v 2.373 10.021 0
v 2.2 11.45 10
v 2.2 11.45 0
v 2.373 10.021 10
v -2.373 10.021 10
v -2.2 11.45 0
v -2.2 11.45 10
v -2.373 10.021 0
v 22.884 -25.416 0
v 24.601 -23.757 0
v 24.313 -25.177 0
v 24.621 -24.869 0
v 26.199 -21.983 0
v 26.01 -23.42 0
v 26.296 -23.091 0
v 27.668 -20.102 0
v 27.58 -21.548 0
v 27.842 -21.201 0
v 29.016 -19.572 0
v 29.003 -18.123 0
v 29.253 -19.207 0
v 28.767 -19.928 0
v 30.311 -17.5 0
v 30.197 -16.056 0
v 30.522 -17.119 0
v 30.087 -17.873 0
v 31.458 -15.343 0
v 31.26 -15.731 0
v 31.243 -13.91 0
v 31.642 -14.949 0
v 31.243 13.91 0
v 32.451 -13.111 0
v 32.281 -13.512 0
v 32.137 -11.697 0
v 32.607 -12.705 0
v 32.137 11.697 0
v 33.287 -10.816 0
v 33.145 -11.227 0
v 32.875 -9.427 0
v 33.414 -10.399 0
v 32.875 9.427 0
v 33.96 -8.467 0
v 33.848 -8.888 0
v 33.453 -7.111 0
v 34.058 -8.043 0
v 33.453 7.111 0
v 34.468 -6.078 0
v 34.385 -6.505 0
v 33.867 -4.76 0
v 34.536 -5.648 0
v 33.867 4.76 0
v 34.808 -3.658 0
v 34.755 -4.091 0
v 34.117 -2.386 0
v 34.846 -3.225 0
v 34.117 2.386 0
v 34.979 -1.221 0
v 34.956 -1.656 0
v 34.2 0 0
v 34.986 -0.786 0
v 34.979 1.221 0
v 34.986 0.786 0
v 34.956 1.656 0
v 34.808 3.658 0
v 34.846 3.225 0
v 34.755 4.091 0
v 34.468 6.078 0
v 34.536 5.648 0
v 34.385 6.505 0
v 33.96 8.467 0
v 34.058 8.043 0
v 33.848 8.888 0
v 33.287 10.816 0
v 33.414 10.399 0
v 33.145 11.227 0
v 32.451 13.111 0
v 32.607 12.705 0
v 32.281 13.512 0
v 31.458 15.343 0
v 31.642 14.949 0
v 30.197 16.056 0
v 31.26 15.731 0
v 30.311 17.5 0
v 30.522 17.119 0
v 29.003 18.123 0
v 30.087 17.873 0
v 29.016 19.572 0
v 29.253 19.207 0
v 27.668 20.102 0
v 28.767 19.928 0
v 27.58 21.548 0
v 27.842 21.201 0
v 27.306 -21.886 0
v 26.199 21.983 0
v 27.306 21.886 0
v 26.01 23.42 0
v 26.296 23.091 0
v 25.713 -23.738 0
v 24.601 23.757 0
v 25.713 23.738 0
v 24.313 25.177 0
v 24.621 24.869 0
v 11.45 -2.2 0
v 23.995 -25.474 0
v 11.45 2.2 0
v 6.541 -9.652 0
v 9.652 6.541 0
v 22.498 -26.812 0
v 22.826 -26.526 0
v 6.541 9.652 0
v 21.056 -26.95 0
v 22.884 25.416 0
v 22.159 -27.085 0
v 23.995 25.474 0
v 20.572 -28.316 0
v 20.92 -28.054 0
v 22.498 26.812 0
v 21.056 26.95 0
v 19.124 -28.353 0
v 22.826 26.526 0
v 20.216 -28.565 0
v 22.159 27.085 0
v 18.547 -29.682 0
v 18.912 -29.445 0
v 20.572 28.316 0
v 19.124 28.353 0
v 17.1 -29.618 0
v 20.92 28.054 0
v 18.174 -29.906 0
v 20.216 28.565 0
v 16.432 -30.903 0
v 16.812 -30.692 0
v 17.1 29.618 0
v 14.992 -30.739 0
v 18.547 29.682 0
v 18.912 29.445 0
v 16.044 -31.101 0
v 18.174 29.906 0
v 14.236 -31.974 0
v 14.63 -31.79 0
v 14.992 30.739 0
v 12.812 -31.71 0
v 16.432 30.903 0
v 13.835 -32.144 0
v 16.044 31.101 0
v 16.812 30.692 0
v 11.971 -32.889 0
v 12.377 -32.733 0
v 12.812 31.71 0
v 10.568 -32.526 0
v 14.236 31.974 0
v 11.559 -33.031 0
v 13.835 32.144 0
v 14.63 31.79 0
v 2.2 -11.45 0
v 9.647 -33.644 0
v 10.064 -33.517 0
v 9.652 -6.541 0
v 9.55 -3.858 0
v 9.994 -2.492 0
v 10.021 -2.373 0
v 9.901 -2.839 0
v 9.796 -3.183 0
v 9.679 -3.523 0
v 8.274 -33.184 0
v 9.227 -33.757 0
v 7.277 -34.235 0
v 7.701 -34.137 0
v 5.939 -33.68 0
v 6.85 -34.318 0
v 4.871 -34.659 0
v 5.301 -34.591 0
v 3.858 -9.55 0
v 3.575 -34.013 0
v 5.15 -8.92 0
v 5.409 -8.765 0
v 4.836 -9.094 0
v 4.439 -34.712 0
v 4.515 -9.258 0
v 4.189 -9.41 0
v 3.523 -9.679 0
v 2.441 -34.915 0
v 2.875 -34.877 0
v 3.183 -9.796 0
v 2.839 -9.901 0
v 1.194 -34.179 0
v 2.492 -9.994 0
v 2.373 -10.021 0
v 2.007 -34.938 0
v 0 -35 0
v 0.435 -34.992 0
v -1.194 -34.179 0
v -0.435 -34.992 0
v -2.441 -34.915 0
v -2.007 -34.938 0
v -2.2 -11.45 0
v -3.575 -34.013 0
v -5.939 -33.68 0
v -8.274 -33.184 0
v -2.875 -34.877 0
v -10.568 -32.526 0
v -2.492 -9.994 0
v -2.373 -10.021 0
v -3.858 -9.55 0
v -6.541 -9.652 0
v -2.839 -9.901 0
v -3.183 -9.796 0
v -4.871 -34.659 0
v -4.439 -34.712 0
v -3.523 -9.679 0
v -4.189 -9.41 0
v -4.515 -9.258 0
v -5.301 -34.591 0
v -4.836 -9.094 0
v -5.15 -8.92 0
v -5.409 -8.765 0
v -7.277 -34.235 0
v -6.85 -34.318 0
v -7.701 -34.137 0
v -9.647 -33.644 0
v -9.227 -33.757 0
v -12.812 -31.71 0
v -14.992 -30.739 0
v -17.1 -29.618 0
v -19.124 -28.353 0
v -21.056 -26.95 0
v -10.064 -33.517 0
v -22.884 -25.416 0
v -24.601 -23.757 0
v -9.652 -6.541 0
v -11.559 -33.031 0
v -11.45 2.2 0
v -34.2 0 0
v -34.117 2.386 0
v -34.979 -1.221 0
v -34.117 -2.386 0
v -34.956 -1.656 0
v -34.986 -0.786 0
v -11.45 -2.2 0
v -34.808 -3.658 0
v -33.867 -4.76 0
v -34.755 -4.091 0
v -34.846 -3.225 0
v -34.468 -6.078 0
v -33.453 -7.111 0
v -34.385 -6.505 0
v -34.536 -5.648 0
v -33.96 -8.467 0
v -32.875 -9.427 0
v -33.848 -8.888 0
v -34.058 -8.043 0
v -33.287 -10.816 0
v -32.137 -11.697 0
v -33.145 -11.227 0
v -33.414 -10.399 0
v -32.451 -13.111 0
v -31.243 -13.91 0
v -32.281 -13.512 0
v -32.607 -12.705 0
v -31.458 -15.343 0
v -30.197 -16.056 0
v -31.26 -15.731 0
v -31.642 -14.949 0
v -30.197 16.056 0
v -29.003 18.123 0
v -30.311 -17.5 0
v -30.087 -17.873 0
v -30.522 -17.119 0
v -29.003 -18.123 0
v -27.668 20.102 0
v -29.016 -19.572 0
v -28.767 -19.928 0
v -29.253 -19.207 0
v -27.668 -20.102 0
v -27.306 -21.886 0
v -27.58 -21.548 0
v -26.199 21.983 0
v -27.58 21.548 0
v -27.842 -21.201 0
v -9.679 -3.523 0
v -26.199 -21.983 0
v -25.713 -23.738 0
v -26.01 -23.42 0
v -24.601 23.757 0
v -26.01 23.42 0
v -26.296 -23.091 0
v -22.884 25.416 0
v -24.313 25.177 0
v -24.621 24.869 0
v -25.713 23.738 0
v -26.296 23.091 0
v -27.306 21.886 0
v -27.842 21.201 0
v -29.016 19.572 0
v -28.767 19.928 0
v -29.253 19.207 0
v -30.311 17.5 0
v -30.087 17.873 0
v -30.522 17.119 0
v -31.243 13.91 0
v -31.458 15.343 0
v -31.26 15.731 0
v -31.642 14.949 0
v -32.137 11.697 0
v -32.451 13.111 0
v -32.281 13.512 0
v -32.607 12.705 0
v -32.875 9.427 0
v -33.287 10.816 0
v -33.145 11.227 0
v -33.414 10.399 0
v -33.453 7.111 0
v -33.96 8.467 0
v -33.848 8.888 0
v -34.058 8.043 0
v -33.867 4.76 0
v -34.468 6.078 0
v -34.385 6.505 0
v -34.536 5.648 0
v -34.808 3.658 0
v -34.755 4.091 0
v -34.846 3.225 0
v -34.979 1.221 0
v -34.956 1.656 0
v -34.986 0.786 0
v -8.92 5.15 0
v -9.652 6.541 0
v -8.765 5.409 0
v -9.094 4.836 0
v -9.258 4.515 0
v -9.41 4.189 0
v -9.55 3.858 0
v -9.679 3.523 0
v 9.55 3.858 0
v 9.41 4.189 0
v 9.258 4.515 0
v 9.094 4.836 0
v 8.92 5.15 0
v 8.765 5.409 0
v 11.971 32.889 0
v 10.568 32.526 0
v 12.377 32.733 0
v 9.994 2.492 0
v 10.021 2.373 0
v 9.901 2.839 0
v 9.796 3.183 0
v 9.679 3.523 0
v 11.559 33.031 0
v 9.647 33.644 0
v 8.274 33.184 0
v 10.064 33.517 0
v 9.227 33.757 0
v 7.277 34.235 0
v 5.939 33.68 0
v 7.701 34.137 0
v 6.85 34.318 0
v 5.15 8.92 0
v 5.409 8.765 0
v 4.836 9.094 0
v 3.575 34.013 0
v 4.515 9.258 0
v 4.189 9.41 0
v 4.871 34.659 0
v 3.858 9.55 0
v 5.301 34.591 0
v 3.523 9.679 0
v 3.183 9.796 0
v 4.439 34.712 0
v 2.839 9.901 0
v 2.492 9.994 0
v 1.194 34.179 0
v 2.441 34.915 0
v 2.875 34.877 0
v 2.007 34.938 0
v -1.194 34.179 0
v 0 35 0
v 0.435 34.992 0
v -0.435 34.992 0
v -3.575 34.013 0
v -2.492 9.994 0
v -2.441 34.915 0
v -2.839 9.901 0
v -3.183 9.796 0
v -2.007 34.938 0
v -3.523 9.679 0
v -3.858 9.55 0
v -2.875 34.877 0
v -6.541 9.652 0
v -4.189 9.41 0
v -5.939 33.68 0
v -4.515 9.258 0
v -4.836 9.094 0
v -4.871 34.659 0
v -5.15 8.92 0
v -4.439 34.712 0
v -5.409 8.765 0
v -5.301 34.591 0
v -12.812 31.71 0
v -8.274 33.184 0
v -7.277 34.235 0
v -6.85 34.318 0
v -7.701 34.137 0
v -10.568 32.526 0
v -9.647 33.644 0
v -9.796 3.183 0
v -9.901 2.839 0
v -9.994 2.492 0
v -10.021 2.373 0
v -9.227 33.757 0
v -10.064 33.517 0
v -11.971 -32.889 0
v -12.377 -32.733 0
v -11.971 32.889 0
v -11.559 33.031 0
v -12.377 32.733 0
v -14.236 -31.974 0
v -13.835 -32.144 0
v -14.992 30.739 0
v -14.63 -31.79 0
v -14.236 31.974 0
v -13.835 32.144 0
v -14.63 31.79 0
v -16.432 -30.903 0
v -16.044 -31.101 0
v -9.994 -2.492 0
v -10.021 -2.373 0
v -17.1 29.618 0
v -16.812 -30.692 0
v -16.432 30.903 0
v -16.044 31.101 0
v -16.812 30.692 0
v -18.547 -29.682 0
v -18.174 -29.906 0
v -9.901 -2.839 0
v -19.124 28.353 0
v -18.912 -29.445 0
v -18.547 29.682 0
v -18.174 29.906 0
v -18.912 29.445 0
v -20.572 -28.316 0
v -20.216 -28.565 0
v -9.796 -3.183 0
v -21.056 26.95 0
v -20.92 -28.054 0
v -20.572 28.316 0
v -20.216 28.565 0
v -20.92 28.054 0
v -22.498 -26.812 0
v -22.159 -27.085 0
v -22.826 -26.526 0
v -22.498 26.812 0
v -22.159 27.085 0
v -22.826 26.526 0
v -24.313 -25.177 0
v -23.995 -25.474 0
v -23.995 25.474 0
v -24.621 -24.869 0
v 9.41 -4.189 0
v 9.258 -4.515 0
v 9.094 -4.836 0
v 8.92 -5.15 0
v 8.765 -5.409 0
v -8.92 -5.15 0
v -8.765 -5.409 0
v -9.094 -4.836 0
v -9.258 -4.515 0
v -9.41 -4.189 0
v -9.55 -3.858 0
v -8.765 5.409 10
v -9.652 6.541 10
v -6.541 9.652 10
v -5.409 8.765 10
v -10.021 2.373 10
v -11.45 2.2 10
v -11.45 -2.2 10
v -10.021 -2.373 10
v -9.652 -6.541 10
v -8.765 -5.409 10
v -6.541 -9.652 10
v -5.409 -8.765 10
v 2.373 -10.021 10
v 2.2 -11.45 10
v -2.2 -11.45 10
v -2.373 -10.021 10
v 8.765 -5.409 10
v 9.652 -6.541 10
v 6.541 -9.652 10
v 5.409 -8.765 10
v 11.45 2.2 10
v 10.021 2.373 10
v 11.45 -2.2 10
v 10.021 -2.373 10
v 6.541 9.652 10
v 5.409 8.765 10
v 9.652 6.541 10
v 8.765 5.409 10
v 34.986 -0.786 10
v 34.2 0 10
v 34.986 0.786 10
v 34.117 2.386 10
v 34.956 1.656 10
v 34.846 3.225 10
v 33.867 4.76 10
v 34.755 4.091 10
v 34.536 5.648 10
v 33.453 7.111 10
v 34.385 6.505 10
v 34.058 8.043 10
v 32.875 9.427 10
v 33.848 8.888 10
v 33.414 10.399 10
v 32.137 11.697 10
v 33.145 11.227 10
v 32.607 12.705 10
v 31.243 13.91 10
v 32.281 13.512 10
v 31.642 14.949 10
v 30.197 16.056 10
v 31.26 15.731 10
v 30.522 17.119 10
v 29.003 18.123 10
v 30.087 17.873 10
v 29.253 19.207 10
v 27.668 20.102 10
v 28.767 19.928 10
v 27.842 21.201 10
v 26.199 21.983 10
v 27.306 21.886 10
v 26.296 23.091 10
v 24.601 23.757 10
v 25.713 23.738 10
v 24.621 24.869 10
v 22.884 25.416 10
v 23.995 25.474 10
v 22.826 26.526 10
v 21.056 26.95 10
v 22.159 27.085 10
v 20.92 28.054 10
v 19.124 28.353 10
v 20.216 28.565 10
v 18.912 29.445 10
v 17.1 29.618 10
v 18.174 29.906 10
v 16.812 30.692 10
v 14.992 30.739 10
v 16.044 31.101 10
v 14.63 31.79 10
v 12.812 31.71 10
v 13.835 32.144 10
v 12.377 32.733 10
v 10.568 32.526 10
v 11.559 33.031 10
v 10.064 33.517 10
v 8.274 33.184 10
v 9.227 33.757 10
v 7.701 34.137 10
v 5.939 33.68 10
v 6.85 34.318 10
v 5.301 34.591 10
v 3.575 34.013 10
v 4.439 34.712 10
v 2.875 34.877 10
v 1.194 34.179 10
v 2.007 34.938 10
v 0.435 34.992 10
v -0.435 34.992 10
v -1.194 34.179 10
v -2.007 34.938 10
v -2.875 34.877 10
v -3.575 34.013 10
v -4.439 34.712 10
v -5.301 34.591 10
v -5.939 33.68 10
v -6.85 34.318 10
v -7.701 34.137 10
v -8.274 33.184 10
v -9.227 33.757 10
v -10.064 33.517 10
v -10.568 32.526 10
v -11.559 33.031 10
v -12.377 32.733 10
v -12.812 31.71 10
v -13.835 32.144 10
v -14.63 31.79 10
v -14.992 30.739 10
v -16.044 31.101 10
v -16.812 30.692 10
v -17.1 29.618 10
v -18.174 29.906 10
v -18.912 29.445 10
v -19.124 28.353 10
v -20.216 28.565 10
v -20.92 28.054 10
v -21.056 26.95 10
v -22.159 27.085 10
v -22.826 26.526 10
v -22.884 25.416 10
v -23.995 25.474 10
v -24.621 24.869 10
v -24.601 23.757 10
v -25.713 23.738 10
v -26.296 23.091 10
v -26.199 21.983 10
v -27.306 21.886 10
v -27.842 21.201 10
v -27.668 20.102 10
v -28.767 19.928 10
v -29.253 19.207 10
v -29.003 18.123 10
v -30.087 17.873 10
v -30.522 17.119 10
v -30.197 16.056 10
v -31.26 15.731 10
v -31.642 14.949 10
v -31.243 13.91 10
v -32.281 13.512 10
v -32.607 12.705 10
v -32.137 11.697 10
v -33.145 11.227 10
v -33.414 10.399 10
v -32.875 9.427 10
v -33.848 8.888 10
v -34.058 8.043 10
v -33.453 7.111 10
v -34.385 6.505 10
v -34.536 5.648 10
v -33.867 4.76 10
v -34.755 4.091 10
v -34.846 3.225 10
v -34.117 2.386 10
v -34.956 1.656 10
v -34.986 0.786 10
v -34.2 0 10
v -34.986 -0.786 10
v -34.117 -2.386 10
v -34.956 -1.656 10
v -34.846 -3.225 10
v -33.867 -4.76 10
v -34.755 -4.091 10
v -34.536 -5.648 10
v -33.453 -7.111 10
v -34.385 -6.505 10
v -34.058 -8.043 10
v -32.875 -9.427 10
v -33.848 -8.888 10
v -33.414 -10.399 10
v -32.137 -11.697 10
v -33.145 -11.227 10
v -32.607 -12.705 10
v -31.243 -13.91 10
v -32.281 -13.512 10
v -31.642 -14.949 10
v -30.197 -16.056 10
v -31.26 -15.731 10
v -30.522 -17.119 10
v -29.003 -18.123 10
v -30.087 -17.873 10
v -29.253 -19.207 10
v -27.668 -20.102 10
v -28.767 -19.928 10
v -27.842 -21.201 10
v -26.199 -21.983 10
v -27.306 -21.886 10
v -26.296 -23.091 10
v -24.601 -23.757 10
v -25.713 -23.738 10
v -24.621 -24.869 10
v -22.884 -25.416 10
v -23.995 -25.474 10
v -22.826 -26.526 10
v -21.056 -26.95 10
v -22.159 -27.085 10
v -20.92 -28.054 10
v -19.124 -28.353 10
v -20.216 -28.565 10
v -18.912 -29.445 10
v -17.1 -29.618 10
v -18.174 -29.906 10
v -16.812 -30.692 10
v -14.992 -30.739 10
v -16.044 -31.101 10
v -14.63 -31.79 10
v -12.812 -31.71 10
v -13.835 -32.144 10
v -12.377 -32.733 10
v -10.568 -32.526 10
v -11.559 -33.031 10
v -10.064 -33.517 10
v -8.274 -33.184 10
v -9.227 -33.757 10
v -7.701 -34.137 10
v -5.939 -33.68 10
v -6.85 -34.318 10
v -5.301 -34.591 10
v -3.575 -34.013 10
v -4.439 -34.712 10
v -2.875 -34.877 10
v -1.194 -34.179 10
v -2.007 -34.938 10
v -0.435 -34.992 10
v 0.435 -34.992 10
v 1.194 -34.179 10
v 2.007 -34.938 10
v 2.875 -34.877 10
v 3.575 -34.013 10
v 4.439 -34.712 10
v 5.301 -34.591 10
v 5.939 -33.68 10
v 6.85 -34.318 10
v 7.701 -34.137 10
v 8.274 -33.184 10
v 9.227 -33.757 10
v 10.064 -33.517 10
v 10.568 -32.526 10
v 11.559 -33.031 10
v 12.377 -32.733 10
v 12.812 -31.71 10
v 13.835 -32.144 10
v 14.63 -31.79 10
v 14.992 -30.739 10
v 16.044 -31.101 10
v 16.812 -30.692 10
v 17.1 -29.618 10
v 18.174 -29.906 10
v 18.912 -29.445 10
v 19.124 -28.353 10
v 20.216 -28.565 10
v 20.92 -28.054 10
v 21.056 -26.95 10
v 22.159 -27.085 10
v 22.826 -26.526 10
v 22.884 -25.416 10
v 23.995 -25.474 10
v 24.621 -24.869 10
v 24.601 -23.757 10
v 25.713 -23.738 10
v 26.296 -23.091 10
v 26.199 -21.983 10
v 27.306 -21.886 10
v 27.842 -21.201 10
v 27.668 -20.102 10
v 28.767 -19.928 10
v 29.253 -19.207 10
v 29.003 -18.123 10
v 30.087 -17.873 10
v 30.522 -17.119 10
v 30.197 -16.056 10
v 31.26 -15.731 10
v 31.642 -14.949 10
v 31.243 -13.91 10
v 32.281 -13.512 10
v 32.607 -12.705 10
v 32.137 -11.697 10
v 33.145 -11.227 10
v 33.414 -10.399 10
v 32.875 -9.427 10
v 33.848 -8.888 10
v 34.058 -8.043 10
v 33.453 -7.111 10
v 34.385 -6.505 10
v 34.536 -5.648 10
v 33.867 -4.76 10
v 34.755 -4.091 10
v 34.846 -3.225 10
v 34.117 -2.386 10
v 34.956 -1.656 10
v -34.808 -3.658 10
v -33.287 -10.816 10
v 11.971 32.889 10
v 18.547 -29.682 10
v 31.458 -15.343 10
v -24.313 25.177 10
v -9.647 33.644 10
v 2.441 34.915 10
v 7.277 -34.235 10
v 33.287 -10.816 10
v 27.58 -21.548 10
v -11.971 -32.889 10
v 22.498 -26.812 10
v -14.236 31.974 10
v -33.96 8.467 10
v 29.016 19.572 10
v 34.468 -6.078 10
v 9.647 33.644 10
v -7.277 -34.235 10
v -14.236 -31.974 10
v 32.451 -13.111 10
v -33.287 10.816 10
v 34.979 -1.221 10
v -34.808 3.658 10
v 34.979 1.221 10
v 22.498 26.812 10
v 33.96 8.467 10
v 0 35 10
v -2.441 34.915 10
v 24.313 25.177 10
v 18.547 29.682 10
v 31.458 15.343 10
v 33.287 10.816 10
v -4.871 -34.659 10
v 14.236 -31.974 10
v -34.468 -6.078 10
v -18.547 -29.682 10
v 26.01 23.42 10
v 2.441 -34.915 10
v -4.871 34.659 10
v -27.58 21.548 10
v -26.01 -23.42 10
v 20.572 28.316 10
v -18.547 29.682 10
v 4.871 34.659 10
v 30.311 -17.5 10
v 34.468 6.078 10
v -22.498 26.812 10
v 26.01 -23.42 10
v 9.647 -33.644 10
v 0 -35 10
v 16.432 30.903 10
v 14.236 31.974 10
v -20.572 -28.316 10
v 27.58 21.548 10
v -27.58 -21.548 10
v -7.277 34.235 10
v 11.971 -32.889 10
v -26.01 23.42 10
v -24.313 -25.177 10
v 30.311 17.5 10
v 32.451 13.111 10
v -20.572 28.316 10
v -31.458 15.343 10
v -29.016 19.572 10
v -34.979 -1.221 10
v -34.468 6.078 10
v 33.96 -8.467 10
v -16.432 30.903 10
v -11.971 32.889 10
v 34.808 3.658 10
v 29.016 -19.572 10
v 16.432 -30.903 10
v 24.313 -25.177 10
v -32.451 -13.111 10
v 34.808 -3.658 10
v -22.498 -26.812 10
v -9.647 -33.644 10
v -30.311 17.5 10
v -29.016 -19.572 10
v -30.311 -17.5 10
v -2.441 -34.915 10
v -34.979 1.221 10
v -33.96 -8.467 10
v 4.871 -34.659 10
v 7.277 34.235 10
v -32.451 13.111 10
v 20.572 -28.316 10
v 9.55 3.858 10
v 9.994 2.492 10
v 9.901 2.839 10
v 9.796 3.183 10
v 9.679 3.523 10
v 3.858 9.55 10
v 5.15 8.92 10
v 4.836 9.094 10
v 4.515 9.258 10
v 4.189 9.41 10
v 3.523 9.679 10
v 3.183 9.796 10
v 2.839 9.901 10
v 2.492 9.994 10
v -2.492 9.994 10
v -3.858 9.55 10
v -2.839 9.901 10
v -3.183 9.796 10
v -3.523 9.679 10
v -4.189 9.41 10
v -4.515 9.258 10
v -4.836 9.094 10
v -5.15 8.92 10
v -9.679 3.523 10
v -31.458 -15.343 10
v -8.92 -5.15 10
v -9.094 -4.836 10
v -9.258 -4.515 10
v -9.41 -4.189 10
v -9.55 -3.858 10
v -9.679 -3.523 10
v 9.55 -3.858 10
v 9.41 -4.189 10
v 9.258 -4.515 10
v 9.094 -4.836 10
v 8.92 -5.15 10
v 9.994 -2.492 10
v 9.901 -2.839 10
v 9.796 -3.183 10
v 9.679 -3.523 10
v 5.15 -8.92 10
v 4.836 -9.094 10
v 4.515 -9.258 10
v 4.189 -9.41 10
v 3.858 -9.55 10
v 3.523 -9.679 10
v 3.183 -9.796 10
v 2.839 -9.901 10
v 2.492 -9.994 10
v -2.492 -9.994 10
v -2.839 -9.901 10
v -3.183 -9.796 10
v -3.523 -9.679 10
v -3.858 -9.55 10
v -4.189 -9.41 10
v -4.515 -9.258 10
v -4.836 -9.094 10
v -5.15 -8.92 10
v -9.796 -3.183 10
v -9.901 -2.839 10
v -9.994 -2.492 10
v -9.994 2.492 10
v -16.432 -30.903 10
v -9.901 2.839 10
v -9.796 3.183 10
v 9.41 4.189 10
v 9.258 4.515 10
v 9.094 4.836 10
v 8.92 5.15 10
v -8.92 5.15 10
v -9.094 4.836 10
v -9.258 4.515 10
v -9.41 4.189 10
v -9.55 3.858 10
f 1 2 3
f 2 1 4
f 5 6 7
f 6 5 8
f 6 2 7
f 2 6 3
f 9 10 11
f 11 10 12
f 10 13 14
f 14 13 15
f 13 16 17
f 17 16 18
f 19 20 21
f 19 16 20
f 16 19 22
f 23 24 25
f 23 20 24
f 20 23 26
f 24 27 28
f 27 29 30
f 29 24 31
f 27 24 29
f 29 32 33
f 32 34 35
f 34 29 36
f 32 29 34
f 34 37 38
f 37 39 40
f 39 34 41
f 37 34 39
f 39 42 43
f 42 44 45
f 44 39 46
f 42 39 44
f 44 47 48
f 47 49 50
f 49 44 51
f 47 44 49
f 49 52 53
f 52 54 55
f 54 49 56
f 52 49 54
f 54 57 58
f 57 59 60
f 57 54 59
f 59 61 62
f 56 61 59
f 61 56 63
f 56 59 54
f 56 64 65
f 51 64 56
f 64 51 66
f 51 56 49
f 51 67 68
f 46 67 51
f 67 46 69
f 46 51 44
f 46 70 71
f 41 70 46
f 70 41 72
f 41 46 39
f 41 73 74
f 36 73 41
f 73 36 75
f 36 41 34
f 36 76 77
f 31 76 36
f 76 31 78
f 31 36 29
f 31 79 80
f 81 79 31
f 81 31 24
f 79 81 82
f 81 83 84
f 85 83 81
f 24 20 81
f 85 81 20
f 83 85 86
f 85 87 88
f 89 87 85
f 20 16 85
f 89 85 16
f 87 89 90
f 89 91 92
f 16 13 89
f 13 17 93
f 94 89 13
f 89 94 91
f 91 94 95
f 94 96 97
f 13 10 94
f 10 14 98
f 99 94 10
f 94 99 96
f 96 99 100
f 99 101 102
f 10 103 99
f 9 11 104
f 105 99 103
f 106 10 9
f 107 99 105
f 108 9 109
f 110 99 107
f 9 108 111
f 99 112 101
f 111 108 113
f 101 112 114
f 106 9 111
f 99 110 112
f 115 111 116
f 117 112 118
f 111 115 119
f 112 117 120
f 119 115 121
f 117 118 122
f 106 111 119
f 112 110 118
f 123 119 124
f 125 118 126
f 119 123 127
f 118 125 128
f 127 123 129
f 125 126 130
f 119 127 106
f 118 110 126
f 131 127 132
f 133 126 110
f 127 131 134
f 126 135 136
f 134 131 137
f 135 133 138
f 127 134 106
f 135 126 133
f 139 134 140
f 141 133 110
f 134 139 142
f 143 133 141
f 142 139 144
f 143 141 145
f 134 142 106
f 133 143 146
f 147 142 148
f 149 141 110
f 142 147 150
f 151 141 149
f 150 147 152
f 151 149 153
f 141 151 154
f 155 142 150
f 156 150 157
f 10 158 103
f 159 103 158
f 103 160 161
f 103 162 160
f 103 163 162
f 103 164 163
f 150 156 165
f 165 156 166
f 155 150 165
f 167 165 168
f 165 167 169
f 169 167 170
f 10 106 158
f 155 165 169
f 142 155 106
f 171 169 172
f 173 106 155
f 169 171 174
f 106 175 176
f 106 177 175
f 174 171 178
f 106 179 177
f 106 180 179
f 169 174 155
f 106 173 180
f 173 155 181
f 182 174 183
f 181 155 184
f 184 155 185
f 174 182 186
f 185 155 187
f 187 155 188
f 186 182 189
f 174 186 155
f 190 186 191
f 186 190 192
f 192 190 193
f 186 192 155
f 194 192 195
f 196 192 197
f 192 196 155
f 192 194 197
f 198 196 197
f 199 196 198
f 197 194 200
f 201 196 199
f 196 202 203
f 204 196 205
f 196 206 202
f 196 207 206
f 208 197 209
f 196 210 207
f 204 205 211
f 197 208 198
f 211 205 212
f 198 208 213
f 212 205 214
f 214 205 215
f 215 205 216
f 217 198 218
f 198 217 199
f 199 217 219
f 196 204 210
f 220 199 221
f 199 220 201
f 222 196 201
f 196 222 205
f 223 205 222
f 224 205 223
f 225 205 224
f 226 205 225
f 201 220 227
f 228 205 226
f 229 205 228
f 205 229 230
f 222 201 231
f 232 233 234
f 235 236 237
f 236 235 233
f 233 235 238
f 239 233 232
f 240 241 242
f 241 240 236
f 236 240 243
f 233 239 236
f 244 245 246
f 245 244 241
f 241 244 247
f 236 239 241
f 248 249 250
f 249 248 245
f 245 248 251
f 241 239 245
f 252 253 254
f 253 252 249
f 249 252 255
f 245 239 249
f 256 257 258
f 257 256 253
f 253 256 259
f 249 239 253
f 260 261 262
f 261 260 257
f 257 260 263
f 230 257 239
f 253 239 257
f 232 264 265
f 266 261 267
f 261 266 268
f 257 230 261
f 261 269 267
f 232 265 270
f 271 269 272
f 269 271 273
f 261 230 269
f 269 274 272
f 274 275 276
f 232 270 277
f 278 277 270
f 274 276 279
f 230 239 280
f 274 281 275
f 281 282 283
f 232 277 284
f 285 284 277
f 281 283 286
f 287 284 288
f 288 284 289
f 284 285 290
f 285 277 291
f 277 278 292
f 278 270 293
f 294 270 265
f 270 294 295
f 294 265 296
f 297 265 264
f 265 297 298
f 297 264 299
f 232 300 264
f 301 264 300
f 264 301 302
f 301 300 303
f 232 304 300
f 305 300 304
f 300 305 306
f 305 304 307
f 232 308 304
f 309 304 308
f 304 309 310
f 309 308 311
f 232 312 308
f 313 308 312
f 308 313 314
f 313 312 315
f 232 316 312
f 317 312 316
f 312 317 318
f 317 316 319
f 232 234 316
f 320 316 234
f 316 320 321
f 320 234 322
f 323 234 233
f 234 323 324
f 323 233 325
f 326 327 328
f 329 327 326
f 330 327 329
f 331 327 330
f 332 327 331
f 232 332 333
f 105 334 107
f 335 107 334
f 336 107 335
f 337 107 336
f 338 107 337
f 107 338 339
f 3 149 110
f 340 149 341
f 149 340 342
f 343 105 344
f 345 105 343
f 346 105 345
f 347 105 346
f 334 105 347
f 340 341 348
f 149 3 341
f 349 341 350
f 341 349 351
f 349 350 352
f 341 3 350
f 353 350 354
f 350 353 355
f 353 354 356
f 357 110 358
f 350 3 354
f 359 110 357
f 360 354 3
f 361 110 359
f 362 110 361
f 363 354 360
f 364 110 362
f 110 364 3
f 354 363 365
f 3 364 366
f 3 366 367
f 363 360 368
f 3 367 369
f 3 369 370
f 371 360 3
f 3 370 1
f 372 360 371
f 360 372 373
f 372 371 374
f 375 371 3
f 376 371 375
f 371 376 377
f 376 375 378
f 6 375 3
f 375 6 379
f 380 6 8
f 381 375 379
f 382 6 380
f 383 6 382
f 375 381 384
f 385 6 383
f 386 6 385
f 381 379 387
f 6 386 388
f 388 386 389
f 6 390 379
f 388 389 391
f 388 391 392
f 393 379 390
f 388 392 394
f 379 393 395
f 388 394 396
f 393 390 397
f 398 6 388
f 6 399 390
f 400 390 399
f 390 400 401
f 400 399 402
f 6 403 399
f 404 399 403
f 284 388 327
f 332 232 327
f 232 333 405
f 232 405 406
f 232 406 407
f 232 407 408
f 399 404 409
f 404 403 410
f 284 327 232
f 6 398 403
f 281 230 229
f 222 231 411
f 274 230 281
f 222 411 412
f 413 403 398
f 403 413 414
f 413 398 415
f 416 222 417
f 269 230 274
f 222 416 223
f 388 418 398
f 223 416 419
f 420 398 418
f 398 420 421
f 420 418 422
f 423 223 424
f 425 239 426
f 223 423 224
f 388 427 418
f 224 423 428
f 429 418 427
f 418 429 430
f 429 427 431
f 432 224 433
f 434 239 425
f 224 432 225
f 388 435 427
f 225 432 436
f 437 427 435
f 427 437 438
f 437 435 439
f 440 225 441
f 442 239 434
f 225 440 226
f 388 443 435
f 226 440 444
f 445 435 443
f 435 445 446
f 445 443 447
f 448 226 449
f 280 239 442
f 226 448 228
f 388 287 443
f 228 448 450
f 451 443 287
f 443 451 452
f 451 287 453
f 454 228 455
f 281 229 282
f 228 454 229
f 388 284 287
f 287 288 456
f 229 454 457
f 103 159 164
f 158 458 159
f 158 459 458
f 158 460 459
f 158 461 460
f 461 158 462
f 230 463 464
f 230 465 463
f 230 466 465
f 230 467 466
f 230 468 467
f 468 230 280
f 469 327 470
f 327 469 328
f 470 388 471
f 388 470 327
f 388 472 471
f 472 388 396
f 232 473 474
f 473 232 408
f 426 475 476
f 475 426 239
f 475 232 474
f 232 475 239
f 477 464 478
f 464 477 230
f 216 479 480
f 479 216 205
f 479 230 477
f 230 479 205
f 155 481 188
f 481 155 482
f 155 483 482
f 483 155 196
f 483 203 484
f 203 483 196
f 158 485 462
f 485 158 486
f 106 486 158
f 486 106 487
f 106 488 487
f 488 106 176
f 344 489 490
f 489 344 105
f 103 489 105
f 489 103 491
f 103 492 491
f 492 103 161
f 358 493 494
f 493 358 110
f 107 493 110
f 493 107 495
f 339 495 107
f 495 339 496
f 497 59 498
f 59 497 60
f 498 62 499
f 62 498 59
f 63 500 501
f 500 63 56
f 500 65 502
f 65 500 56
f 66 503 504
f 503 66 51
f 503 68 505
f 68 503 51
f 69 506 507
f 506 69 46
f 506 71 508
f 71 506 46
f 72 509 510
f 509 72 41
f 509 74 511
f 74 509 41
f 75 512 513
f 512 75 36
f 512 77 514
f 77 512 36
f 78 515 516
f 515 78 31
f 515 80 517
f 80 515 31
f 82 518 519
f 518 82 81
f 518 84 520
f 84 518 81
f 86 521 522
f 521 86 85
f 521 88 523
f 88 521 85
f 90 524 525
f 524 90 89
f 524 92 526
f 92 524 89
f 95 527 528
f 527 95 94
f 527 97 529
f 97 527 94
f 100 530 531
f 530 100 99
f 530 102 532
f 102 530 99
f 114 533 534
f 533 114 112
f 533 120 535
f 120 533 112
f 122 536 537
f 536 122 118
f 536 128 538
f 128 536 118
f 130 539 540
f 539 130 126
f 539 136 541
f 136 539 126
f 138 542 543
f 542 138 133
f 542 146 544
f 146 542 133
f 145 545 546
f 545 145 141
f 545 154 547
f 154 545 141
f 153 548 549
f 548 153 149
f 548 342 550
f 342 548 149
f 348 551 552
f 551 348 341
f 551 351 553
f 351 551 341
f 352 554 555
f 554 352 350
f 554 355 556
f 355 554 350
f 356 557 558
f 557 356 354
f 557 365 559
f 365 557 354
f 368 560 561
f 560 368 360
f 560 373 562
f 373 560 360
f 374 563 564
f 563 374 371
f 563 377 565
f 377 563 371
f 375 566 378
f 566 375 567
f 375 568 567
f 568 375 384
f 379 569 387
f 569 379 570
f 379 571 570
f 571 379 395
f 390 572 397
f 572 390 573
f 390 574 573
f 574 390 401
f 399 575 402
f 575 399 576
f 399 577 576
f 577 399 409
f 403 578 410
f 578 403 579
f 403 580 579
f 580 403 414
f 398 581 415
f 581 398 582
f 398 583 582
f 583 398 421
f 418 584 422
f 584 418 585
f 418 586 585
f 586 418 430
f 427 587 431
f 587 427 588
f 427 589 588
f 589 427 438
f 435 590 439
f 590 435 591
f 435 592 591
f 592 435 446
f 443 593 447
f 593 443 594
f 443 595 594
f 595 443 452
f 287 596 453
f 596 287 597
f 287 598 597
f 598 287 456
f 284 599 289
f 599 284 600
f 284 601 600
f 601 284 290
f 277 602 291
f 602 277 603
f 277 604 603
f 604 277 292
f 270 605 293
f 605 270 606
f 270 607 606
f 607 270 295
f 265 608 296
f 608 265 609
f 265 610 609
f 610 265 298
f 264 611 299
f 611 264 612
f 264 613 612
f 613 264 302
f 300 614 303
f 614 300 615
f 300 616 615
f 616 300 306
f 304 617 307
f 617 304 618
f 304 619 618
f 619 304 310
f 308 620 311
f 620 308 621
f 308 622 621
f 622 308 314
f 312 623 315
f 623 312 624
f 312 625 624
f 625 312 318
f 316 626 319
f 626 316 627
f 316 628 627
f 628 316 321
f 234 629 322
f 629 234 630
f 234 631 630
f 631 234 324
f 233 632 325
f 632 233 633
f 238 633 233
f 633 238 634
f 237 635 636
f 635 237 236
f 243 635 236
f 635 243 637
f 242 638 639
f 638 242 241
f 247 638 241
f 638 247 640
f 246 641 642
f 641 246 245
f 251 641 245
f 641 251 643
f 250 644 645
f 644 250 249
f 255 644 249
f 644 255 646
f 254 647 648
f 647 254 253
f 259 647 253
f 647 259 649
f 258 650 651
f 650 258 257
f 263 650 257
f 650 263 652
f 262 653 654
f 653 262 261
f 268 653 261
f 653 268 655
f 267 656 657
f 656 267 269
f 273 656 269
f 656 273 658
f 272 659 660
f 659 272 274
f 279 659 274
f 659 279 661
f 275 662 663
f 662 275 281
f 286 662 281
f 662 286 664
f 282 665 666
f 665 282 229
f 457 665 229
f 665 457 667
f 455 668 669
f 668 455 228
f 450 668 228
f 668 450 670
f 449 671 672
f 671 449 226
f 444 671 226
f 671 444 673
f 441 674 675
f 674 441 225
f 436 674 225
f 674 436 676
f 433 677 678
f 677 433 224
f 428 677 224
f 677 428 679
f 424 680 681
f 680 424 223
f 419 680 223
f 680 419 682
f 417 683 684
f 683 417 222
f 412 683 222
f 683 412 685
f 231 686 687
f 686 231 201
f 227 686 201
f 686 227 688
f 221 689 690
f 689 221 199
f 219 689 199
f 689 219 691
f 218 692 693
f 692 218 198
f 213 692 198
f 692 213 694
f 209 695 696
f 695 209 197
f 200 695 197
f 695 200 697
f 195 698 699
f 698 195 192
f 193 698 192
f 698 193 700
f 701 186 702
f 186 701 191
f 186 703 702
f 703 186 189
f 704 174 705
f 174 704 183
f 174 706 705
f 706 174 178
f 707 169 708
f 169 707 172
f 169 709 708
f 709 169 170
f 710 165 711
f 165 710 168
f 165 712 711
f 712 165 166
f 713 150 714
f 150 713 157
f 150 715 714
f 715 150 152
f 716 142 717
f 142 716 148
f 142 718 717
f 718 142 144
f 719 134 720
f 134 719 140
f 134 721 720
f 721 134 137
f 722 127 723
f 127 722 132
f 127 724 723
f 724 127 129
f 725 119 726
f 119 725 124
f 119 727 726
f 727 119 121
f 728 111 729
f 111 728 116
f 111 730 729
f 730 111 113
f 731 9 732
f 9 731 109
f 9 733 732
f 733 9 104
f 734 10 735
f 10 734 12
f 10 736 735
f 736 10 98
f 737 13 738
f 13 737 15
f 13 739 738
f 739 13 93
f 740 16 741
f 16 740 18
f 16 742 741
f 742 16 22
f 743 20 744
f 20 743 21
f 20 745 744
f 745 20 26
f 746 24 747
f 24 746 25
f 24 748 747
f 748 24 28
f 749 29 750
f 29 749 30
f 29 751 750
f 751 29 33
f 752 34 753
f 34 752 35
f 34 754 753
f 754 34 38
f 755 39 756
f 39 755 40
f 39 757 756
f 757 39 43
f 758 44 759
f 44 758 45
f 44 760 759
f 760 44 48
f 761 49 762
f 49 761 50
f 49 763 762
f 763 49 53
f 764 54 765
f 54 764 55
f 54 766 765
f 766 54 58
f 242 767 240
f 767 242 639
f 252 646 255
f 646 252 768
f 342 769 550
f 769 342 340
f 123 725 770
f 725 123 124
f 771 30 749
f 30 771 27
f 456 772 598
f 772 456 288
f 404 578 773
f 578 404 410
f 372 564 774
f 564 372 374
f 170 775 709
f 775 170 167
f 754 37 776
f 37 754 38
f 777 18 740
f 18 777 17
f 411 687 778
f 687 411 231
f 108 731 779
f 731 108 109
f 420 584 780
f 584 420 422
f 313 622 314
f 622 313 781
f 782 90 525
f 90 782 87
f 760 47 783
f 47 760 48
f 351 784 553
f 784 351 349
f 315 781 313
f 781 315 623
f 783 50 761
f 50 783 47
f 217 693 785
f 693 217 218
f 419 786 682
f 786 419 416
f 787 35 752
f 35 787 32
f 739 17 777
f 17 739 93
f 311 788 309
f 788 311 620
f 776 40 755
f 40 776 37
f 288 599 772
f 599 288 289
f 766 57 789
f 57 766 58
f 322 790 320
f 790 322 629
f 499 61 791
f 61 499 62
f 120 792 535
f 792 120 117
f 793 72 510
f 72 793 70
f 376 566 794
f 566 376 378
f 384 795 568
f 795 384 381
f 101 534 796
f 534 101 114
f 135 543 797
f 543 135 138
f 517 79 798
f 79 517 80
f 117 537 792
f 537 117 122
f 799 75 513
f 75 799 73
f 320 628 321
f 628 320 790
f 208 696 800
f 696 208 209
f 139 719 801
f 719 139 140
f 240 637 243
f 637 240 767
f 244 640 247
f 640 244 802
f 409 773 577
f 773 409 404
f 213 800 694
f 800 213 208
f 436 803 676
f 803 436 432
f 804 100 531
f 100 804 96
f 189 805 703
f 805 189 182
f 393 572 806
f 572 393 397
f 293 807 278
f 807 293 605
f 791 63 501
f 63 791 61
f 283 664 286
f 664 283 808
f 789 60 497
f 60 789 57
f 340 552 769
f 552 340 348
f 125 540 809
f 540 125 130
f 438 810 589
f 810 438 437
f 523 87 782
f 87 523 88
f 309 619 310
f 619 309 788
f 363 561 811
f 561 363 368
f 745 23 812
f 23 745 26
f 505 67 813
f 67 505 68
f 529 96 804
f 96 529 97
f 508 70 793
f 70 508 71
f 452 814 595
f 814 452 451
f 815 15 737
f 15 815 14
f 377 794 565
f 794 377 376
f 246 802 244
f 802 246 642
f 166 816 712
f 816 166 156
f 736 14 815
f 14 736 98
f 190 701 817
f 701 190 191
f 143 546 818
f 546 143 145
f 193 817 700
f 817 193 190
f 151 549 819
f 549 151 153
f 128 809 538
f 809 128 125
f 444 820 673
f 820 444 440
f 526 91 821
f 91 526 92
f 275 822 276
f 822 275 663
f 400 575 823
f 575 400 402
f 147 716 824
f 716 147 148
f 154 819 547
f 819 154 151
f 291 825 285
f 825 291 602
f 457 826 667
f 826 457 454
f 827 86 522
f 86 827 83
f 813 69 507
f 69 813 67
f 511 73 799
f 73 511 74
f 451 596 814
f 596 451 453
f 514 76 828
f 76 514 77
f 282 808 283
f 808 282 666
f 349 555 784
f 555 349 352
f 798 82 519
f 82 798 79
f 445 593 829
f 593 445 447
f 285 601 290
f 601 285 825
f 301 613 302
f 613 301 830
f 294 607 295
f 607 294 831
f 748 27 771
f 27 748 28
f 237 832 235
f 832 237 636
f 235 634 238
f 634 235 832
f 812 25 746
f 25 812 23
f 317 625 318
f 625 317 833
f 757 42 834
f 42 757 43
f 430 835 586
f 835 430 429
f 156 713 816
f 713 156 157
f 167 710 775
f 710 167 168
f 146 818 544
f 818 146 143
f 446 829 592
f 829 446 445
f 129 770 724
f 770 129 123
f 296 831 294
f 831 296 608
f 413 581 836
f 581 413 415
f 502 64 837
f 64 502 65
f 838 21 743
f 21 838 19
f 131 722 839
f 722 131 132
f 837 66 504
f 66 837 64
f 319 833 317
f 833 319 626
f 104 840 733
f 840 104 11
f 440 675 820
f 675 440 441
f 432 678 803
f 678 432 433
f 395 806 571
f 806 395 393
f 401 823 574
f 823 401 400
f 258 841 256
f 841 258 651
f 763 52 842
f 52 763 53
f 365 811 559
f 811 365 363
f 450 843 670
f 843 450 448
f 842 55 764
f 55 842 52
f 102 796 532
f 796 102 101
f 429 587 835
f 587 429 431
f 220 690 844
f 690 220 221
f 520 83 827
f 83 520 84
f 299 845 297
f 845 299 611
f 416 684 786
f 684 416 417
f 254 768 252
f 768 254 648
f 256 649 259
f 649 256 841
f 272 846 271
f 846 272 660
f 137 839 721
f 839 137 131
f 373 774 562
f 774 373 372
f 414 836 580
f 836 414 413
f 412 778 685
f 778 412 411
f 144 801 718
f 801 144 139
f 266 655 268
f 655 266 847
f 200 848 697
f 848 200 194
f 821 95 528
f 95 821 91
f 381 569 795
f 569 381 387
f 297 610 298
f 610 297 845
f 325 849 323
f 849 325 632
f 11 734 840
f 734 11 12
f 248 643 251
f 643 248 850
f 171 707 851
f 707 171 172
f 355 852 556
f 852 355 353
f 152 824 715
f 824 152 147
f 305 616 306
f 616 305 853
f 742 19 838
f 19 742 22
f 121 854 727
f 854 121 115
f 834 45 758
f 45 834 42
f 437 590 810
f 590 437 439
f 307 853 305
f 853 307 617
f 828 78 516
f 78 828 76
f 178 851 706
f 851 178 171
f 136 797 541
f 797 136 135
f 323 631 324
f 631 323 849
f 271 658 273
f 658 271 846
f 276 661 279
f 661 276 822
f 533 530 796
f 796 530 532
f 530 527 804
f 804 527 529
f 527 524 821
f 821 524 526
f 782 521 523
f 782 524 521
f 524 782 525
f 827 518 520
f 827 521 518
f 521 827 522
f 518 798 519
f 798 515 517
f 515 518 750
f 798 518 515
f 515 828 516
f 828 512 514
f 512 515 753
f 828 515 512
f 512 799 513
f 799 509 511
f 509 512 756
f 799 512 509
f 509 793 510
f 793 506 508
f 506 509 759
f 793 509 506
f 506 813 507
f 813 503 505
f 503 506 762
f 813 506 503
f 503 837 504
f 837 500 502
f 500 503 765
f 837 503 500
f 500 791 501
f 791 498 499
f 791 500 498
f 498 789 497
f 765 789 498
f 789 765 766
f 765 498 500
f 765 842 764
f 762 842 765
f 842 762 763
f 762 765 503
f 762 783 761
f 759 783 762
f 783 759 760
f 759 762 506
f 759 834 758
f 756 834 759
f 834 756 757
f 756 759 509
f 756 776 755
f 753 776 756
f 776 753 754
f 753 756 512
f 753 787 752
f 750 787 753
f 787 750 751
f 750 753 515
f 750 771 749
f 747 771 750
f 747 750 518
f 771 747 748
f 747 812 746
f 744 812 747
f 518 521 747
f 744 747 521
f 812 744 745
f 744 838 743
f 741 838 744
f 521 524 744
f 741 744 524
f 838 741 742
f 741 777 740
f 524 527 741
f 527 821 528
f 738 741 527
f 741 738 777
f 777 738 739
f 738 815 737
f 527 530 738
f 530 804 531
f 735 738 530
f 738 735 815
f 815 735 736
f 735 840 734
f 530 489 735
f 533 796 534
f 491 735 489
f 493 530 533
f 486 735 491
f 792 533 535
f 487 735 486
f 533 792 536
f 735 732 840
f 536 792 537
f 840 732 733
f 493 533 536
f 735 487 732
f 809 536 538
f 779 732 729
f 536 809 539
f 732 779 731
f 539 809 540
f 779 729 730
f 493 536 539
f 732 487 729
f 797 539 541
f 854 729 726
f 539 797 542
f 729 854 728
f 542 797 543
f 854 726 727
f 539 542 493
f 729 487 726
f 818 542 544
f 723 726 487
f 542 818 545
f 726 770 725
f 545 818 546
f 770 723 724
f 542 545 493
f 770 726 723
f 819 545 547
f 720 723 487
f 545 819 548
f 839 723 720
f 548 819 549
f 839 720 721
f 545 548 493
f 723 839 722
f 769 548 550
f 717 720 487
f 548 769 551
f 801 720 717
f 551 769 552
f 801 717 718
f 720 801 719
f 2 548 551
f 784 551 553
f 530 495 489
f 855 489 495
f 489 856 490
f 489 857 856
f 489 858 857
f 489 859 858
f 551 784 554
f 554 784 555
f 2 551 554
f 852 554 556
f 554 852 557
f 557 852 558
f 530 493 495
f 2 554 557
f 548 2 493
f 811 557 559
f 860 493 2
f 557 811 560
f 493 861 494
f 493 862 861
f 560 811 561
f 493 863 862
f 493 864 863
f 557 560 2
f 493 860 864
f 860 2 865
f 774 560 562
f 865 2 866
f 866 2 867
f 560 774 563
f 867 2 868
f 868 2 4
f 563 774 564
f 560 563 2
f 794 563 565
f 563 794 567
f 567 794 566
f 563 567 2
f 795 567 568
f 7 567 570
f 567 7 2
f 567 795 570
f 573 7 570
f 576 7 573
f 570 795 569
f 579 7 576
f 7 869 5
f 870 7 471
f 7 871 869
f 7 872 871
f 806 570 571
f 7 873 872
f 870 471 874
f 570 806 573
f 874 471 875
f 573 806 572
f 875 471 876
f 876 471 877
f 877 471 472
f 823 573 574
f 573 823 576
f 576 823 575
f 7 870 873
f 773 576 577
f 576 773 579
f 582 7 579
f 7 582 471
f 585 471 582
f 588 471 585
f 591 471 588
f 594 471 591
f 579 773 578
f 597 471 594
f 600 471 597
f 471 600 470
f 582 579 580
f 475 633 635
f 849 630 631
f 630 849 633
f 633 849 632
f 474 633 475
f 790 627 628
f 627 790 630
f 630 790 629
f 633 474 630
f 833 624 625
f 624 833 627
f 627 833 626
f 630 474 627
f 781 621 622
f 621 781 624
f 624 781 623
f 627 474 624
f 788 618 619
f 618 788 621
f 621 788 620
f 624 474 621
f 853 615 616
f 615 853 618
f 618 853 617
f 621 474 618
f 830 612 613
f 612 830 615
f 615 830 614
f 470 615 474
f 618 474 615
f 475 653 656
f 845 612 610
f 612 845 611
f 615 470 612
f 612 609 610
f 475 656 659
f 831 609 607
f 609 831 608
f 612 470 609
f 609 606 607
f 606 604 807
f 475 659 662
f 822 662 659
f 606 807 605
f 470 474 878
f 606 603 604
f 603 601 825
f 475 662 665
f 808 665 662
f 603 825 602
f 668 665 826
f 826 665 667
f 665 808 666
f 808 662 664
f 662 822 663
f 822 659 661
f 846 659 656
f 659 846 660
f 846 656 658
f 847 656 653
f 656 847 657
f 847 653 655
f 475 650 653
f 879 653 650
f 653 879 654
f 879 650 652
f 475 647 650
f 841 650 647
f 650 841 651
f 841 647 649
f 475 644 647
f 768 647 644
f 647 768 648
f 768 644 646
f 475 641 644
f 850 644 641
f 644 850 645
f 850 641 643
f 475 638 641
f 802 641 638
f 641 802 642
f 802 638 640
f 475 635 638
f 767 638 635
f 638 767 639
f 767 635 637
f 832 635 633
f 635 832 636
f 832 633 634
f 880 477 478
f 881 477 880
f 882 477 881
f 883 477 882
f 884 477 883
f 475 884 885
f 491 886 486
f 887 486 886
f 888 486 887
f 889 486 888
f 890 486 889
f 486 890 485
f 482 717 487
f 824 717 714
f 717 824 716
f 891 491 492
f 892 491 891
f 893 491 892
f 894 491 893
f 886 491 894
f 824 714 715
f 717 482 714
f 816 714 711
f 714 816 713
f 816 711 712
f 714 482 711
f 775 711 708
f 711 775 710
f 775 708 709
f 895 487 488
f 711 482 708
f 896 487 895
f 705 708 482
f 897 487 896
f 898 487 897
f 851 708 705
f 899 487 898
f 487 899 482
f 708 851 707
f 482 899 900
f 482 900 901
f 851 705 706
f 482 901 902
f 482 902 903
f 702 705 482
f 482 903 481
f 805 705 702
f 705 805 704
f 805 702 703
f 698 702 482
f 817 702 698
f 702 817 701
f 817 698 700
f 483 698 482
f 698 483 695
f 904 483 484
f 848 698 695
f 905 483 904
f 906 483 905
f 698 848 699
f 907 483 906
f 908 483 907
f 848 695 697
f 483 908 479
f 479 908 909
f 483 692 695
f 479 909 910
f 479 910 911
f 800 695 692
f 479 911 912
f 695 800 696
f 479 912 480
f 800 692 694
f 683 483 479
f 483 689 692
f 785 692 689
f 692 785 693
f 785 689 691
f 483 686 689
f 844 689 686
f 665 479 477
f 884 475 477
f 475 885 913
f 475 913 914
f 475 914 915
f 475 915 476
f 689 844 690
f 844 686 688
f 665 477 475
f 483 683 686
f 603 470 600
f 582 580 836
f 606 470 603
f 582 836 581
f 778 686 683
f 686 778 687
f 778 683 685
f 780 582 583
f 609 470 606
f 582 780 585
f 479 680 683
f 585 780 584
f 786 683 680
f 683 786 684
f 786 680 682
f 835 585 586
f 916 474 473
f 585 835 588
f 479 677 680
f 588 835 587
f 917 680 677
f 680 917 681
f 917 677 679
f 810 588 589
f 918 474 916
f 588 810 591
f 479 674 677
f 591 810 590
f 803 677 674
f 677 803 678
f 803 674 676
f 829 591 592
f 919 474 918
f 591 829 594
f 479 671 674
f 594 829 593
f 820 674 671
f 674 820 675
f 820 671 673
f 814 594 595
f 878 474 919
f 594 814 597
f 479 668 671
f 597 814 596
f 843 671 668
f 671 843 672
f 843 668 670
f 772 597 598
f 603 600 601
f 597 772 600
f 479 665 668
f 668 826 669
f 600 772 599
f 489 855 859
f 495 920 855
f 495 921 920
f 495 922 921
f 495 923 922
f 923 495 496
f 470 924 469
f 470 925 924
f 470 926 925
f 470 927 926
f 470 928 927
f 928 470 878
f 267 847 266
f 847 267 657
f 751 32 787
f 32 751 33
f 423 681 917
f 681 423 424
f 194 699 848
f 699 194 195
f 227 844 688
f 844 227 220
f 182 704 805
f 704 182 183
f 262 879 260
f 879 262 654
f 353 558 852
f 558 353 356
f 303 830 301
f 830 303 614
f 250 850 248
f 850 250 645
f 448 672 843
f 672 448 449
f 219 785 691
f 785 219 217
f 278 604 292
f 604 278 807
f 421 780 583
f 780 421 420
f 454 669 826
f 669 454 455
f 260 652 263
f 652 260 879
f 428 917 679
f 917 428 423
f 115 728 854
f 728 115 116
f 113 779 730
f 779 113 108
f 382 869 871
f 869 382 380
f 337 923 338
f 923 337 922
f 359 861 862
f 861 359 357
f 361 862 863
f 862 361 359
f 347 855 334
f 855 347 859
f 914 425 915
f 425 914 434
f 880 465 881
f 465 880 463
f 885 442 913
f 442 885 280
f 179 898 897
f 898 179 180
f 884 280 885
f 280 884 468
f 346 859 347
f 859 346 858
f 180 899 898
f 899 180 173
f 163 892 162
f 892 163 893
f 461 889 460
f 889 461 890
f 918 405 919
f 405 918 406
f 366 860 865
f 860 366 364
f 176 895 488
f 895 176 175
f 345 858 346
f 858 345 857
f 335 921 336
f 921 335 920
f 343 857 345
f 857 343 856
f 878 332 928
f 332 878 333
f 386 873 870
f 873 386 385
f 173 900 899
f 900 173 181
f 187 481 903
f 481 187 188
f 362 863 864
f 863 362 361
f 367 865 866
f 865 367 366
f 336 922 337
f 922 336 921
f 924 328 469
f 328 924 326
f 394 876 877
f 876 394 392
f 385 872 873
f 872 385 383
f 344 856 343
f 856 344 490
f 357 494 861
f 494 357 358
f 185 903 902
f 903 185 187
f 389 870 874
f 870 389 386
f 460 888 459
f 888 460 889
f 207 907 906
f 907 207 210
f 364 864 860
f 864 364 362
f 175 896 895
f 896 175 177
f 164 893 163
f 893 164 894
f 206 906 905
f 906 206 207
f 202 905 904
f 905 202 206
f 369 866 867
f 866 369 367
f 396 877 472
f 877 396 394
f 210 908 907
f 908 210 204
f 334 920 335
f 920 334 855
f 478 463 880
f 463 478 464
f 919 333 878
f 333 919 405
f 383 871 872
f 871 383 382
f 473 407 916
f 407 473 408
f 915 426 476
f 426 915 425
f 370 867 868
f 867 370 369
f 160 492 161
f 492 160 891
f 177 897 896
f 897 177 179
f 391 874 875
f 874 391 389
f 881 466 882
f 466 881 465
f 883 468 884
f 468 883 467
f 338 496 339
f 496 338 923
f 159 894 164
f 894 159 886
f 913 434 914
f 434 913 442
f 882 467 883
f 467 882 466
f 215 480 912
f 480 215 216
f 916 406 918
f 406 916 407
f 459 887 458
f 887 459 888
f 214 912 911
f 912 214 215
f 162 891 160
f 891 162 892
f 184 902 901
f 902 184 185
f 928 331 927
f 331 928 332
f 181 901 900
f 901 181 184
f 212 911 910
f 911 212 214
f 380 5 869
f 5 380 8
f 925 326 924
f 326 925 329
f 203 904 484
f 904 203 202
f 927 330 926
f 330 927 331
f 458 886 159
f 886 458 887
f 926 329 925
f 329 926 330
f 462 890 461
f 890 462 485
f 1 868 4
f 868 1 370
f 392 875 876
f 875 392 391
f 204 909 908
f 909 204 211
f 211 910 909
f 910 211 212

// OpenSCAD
// fine focus knob for CPC 800

// stock knob dimensions
OD_inner = 20.2; 
OD_outer = 22.1;
rib_width = 4.7;
rib_locations = [0, 45, 90, 135, 180, 225, 270, 315];
rib_ht = 0.5 * ( OD_outer - OD_inner );

// fine focus knob dimensions
tol = 0.2;
OD = 70.0;
rO = 0.5 * OD;
thk = 10.0;
rI = 0.5 * OD_inner + tol;
rR = rI + rib_ht + tol;

// rib cutouts
b1 = rib_width + 0.5* tol;
half_b1 = 0.5 * b1;
b2 = rib_width - 0.2 - 0.5*tol;
half_b2 = 0.5 * b2;
knurl = 0.8;

$fn = 180;

difference() {
	cylinder( h = thk, r1 = rO, r2 = rO ); // main solid wheel
	cylinder( h = thk+0.1, r1 = rI, r2 = rI ); // cut out the small cylinder
	// next, cut out for the ribs
	for( a = rib_locations )
		rotate( a )
			linear_extrude( height = thk+0.1 )
				polygon( points = [ [-half_b1, rI - 0.5], [-half_b2, rR], 
									[half_b2, rR], [ half_b1, rI - 0.5] ] );

	// next, cut out notches around outside perimeter for grip
	for( i = [0: 4: 360] )
		rotate( i )
			linear_extrude( height = thk+0.1 )
				polygon( points = [ [rO - knurl, 0 ], [rO+knurl, -2*knurl], 
							[rO + knurl, 2*knurl] ] );
	
} // difference
